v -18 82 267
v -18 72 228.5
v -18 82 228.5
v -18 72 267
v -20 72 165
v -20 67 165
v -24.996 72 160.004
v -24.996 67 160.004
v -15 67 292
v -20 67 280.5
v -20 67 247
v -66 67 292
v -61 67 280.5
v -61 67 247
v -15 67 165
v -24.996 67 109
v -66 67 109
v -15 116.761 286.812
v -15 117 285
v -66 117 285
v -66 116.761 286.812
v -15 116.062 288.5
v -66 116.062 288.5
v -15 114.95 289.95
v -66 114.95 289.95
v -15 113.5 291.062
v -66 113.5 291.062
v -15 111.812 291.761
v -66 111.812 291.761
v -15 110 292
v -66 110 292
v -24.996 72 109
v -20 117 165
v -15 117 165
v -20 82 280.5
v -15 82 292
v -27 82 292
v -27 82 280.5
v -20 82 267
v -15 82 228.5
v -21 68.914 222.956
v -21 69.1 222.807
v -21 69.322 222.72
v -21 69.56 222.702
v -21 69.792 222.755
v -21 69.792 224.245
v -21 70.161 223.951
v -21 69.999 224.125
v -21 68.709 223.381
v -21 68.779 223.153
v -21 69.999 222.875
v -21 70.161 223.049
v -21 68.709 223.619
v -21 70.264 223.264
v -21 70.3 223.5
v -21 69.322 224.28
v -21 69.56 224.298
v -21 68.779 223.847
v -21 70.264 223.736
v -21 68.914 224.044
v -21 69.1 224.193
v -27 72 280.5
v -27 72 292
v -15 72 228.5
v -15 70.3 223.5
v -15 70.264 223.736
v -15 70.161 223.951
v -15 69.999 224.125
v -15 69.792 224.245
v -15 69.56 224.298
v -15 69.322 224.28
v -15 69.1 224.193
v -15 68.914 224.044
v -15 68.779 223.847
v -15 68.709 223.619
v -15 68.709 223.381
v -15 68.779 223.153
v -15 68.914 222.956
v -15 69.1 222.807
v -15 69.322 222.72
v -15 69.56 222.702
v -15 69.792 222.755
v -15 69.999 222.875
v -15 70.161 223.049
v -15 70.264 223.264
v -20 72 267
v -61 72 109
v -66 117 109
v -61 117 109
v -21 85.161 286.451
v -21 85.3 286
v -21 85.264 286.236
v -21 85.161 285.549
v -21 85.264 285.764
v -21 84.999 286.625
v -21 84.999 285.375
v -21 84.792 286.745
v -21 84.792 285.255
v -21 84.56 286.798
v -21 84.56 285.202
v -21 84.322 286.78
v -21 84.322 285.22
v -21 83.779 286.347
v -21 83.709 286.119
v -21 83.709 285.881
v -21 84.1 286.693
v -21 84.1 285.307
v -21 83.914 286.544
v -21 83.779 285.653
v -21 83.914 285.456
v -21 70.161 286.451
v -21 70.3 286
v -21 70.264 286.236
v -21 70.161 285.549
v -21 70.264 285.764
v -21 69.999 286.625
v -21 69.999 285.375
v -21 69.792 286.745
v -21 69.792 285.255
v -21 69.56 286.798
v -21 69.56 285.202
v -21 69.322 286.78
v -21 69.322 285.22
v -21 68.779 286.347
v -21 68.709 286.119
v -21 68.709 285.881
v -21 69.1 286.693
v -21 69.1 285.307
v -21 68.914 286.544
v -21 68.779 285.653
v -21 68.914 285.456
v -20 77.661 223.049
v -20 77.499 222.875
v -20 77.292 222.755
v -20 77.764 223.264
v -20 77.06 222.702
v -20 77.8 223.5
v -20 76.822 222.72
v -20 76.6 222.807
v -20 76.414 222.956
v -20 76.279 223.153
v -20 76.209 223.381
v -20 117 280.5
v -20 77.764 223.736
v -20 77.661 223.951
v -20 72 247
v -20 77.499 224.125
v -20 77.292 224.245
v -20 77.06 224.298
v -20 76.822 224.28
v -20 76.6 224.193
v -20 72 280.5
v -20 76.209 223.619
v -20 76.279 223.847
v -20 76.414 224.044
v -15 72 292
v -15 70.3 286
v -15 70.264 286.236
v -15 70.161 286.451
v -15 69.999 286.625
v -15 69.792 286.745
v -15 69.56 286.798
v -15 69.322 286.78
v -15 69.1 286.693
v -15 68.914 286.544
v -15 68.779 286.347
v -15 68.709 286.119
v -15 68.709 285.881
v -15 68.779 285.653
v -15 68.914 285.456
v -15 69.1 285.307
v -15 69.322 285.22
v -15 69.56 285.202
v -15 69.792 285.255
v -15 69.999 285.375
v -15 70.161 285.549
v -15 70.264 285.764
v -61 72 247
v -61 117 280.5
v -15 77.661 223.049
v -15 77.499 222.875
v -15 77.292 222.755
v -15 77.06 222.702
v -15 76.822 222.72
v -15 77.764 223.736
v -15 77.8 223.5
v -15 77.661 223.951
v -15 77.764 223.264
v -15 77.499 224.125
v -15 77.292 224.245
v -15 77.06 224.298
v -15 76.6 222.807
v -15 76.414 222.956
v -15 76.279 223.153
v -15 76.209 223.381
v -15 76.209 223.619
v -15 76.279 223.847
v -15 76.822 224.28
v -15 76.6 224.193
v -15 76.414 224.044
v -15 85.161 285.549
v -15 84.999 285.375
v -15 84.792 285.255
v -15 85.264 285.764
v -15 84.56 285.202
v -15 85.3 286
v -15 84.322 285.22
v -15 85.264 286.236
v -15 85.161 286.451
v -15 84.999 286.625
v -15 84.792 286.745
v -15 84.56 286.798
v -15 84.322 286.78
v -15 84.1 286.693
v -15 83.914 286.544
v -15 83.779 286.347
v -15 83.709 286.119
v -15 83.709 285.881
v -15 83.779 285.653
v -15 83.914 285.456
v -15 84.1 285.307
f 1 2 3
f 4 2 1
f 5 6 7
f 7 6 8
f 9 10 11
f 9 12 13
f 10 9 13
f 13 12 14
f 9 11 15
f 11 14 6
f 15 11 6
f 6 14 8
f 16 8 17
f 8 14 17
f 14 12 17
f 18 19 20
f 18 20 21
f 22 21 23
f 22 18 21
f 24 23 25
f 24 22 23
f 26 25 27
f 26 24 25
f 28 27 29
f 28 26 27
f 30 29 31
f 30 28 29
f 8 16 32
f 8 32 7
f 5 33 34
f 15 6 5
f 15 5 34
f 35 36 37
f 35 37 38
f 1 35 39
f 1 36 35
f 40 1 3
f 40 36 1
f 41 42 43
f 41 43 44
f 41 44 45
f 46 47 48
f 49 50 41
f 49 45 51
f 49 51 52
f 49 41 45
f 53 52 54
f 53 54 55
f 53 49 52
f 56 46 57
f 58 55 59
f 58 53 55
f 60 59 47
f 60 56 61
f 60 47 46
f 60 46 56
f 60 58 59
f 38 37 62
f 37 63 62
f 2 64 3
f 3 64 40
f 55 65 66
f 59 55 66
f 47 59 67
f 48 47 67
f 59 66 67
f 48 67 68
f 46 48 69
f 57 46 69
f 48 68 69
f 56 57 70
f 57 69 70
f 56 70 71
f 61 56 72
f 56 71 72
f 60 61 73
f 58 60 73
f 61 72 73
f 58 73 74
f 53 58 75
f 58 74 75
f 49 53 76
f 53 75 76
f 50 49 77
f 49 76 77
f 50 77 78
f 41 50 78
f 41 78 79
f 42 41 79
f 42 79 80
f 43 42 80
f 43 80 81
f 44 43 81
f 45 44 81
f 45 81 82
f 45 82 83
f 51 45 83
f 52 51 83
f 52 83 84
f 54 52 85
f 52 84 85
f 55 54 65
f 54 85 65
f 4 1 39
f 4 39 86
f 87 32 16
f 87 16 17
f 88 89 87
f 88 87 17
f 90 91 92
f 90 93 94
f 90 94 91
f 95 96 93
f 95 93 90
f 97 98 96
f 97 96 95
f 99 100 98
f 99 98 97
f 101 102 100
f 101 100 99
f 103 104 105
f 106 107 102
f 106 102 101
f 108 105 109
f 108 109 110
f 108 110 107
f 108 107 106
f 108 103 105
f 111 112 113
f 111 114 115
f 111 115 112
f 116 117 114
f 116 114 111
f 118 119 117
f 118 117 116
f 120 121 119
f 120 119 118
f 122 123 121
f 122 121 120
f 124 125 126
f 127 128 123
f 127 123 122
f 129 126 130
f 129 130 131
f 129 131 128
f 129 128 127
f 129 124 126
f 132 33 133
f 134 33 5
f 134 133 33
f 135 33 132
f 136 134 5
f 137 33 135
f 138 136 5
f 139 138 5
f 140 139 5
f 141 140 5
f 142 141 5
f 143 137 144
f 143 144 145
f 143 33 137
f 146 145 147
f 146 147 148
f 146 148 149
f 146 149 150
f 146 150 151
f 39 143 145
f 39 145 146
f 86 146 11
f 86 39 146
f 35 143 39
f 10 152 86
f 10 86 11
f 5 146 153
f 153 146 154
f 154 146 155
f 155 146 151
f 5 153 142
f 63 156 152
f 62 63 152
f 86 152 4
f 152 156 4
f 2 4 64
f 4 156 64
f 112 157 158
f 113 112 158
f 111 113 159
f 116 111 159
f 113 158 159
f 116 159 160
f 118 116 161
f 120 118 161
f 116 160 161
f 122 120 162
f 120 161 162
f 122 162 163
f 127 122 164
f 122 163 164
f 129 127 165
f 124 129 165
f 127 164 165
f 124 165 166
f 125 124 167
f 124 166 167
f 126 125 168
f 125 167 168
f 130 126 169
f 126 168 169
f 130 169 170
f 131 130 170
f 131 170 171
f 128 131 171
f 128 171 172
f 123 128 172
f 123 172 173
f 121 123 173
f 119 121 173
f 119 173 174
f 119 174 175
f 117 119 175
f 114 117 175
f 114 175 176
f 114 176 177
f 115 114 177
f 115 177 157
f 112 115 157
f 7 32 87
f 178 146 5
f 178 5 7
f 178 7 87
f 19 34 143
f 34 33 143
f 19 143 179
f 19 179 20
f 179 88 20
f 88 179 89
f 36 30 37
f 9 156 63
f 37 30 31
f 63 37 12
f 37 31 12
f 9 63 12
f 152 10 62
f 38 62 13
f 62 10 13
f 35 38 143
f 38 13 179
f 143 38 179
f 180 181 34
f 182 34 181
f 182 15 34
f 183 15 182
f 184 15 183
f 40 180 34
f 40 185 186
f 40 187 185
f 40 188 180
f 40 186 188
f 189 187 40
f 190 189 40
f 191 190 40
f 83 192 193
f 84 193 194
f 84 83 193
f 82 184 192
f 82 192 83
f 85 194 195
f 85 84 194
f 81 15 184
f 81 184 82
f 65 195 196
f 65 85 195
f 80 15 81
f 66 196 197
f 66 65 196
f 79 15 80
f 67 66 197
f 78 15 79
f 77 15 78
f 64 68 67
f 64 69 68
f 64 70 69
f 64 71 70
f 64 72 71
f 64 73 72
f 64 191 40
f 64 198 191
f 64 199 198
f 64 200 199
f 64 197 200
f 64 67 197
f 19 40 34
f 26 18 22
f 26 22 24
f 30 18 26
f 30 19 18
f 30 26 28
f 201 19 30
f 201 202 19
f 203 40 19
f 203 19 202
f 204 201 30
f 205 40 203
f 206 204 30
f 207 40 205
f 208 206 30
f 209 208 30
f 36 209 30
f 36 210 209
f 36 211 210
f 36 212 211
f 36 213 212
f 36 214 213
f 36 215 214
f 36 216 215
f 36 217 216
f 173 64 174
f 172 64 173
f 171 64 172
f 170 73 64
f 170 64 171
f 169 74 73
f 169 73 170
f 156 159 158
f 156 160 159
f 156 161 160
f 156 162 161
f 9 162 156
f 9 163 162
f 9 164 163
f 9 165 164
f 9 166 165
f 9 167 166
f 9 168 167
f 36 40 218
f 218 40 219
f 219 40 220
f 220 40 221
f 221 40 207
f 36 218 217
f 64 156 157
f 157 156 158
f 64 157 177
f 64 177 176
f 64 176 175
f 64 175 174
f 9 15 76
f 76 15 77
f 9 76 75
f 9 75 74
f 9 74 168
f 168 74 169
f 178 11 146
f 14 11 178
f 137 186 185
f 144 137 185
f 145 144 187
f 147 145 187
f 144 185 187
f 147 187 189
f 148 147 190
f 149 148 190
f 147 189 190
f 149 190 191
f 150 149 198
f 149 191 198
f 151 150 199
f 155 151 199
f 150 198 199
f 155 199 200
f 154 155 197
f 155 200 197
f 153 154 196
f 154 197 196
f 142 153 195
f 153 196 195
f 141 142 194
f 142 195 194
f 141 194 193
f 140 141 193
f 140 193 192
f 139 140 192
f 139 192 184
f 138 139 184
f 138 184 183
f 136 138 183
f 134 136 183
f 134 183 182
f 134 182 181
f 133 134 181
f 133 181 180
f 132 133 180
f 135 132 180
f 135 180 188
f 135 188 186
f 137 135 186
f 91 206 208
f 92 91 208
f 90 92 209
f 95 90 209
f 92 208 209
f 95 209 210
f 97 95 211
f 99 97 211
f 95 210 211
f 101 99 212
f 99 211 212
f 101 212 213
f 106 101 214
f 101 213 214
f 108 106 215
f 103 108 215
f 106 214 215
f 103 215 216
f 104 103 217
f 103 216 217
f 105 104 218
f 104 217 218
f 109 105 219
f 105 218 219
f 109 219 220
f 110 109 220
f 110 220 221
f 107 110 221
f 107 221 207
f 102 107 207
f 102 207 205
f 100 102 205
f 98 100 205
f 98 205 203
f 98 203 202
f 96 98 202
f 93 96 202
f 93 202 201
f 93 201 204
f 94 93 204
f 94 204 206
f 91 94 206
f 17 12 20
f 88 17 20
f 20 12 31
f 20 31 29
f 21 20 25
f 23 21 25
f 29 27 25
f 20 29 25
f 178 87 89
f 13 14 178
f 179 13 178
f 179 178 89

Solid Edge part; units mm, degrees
sketch "Sketch1" plane through (-117, 0, 0) normal (1, 0, 0) x (0, 1, 0)
  line L0 (117, 280.5) -> (117, 292)
  line L1 (117, 292) -> (67, 292)
  line L2 (67, 292) -> (67, 280.5)
  line L3 (67, 280.5) -> (117, 280.5)
extrude "Protrusion1" add sketch "Sketch1" along normal blind 102
fillet "Round_1" radius 7 1 edges at (-66, 117, 292)
sketch "Sketch2" plane through (-66, 92, 280.5) normal (0, 0, -1) x (1, 0, 0)
  line L0 (51, 25) -> (0, 25)
  line L1 (0, 25) -> (0, -25)
  line L2 (0, -25) -> (5, -25)
  line L3 (5, 20) -> (5, -25)
  line L4 (46, 20) -> (5, 20)
  line L5 (46, -25) -> (46, 20)
  line L6 (46, -25) -> (51, -25)
  line L7 (51, -25) -> (51, 25)
extrude "ExtrudedProtrusion_2" add sketch "Sketch2" along normal blind 171.5
sketch "Sketch3" plane through (-66, 67, 200.4979) normal (0, -1, 0) x (1, 0, 0)
  line L0 (5, 80.0021) -> (46, 80.0021)
  line L1 (46, 80.0021) -> (46, 46.5021)
  line L2 (46, 46.5021) -> (5, 46.5021)
  line L3 (5, 46.5021) -> (5, 80.0021)
extrude "Cutout1" cut sketch "Sketch3" against normal up to next
sketch "Sketch4" plane through (-15, 92, 200.4979) normal (1, 0, 0) x (0, 1, 0)
  line L0 (-10, 91.5021) -> (-10, 66.5021)
  line L1 (-10, 66.5021) -> (-20, 66.5021)
  line L2 (-20, 91.5021) -> (-20, 66.5021)
  line L3 (-20, 91.5021) -> (-10, 91.5021)
extrude "ExtrudedCutout_2" cut sketch "Sketch4" against normal blind 12
sketch "Sketch5" plane through (-15, 92, 200.4979) normal (1, 0, 0) x (0, 1, 0)
  line L0 (-10, 28.0021) -> (-10, 66.5021)
  line L1 (-10, 66.5021) -> (-20, 66.5021)
  line L2 (-20, 66.5021) -> (-20, 28.0021)
  line L3 (-20, 28.0021) -> (-10, 28.0021)
extrude "ExtrudedCutout_3" cut sketch "Sketch5" against normal blind 3
sketch "Sketch6" plane through (-15, 92, 200.4979) normal (1, 0, 0) x (0, 1, 0)
  circle A0 centre (-15, 23.0021) radius 0.8
extrude "Cutout2" cut sketch "Sketch6" against normal up to next
sketch "Sketch7" plane through (-15, 92, 200.4979) normal (1, 0, 0) x (0, 1, 0)
  circle A0 centre (-22.5, 85.5021) radius 0.8
  circle A1 centre (-7.5, 85.5021) radius 0.8
  circle A2 centre (-22.5, 23.0021) radius 0.8
extrude "ExtrudedCutout_5" cut sketch "Sketch7" against normal blind 6
sketch "Sketch8" plane through (-66, 67, 200.4979) normal (0, -1, 0) x (1, 0, 0)
  line L0 (46, -35.4979) -> (51, -35.4979)
  line L1 (51, -35.4979) -> (51, -91.4979)
  line L2 (51, -91.4979) -> (41.0042, -91.4979)
  line L3 (41.0042, -91.4979) -> (41.0042, -40.4937)
  line L4 (46, -35.4979) -> (41.0042, -40.4937)
extrude "Cutout3" cut sketch "Sketch8" against normal up to next
sketch "Sketch9" plane through (-117, 0, 0) normal (1, 0, 0) x (0, 1, 0)
  line L0 (117, 292) -> (67, 292)
  line L1 (67, 292) -> (67, 280.5)
  line L2 (67, 280.5) -> (117, 280.5)
  line L3 (117, 280.5) -> (117, 292)
extrude "ExtrudedCutout_7" cut sketch "Sketch9" along normal blind 51
